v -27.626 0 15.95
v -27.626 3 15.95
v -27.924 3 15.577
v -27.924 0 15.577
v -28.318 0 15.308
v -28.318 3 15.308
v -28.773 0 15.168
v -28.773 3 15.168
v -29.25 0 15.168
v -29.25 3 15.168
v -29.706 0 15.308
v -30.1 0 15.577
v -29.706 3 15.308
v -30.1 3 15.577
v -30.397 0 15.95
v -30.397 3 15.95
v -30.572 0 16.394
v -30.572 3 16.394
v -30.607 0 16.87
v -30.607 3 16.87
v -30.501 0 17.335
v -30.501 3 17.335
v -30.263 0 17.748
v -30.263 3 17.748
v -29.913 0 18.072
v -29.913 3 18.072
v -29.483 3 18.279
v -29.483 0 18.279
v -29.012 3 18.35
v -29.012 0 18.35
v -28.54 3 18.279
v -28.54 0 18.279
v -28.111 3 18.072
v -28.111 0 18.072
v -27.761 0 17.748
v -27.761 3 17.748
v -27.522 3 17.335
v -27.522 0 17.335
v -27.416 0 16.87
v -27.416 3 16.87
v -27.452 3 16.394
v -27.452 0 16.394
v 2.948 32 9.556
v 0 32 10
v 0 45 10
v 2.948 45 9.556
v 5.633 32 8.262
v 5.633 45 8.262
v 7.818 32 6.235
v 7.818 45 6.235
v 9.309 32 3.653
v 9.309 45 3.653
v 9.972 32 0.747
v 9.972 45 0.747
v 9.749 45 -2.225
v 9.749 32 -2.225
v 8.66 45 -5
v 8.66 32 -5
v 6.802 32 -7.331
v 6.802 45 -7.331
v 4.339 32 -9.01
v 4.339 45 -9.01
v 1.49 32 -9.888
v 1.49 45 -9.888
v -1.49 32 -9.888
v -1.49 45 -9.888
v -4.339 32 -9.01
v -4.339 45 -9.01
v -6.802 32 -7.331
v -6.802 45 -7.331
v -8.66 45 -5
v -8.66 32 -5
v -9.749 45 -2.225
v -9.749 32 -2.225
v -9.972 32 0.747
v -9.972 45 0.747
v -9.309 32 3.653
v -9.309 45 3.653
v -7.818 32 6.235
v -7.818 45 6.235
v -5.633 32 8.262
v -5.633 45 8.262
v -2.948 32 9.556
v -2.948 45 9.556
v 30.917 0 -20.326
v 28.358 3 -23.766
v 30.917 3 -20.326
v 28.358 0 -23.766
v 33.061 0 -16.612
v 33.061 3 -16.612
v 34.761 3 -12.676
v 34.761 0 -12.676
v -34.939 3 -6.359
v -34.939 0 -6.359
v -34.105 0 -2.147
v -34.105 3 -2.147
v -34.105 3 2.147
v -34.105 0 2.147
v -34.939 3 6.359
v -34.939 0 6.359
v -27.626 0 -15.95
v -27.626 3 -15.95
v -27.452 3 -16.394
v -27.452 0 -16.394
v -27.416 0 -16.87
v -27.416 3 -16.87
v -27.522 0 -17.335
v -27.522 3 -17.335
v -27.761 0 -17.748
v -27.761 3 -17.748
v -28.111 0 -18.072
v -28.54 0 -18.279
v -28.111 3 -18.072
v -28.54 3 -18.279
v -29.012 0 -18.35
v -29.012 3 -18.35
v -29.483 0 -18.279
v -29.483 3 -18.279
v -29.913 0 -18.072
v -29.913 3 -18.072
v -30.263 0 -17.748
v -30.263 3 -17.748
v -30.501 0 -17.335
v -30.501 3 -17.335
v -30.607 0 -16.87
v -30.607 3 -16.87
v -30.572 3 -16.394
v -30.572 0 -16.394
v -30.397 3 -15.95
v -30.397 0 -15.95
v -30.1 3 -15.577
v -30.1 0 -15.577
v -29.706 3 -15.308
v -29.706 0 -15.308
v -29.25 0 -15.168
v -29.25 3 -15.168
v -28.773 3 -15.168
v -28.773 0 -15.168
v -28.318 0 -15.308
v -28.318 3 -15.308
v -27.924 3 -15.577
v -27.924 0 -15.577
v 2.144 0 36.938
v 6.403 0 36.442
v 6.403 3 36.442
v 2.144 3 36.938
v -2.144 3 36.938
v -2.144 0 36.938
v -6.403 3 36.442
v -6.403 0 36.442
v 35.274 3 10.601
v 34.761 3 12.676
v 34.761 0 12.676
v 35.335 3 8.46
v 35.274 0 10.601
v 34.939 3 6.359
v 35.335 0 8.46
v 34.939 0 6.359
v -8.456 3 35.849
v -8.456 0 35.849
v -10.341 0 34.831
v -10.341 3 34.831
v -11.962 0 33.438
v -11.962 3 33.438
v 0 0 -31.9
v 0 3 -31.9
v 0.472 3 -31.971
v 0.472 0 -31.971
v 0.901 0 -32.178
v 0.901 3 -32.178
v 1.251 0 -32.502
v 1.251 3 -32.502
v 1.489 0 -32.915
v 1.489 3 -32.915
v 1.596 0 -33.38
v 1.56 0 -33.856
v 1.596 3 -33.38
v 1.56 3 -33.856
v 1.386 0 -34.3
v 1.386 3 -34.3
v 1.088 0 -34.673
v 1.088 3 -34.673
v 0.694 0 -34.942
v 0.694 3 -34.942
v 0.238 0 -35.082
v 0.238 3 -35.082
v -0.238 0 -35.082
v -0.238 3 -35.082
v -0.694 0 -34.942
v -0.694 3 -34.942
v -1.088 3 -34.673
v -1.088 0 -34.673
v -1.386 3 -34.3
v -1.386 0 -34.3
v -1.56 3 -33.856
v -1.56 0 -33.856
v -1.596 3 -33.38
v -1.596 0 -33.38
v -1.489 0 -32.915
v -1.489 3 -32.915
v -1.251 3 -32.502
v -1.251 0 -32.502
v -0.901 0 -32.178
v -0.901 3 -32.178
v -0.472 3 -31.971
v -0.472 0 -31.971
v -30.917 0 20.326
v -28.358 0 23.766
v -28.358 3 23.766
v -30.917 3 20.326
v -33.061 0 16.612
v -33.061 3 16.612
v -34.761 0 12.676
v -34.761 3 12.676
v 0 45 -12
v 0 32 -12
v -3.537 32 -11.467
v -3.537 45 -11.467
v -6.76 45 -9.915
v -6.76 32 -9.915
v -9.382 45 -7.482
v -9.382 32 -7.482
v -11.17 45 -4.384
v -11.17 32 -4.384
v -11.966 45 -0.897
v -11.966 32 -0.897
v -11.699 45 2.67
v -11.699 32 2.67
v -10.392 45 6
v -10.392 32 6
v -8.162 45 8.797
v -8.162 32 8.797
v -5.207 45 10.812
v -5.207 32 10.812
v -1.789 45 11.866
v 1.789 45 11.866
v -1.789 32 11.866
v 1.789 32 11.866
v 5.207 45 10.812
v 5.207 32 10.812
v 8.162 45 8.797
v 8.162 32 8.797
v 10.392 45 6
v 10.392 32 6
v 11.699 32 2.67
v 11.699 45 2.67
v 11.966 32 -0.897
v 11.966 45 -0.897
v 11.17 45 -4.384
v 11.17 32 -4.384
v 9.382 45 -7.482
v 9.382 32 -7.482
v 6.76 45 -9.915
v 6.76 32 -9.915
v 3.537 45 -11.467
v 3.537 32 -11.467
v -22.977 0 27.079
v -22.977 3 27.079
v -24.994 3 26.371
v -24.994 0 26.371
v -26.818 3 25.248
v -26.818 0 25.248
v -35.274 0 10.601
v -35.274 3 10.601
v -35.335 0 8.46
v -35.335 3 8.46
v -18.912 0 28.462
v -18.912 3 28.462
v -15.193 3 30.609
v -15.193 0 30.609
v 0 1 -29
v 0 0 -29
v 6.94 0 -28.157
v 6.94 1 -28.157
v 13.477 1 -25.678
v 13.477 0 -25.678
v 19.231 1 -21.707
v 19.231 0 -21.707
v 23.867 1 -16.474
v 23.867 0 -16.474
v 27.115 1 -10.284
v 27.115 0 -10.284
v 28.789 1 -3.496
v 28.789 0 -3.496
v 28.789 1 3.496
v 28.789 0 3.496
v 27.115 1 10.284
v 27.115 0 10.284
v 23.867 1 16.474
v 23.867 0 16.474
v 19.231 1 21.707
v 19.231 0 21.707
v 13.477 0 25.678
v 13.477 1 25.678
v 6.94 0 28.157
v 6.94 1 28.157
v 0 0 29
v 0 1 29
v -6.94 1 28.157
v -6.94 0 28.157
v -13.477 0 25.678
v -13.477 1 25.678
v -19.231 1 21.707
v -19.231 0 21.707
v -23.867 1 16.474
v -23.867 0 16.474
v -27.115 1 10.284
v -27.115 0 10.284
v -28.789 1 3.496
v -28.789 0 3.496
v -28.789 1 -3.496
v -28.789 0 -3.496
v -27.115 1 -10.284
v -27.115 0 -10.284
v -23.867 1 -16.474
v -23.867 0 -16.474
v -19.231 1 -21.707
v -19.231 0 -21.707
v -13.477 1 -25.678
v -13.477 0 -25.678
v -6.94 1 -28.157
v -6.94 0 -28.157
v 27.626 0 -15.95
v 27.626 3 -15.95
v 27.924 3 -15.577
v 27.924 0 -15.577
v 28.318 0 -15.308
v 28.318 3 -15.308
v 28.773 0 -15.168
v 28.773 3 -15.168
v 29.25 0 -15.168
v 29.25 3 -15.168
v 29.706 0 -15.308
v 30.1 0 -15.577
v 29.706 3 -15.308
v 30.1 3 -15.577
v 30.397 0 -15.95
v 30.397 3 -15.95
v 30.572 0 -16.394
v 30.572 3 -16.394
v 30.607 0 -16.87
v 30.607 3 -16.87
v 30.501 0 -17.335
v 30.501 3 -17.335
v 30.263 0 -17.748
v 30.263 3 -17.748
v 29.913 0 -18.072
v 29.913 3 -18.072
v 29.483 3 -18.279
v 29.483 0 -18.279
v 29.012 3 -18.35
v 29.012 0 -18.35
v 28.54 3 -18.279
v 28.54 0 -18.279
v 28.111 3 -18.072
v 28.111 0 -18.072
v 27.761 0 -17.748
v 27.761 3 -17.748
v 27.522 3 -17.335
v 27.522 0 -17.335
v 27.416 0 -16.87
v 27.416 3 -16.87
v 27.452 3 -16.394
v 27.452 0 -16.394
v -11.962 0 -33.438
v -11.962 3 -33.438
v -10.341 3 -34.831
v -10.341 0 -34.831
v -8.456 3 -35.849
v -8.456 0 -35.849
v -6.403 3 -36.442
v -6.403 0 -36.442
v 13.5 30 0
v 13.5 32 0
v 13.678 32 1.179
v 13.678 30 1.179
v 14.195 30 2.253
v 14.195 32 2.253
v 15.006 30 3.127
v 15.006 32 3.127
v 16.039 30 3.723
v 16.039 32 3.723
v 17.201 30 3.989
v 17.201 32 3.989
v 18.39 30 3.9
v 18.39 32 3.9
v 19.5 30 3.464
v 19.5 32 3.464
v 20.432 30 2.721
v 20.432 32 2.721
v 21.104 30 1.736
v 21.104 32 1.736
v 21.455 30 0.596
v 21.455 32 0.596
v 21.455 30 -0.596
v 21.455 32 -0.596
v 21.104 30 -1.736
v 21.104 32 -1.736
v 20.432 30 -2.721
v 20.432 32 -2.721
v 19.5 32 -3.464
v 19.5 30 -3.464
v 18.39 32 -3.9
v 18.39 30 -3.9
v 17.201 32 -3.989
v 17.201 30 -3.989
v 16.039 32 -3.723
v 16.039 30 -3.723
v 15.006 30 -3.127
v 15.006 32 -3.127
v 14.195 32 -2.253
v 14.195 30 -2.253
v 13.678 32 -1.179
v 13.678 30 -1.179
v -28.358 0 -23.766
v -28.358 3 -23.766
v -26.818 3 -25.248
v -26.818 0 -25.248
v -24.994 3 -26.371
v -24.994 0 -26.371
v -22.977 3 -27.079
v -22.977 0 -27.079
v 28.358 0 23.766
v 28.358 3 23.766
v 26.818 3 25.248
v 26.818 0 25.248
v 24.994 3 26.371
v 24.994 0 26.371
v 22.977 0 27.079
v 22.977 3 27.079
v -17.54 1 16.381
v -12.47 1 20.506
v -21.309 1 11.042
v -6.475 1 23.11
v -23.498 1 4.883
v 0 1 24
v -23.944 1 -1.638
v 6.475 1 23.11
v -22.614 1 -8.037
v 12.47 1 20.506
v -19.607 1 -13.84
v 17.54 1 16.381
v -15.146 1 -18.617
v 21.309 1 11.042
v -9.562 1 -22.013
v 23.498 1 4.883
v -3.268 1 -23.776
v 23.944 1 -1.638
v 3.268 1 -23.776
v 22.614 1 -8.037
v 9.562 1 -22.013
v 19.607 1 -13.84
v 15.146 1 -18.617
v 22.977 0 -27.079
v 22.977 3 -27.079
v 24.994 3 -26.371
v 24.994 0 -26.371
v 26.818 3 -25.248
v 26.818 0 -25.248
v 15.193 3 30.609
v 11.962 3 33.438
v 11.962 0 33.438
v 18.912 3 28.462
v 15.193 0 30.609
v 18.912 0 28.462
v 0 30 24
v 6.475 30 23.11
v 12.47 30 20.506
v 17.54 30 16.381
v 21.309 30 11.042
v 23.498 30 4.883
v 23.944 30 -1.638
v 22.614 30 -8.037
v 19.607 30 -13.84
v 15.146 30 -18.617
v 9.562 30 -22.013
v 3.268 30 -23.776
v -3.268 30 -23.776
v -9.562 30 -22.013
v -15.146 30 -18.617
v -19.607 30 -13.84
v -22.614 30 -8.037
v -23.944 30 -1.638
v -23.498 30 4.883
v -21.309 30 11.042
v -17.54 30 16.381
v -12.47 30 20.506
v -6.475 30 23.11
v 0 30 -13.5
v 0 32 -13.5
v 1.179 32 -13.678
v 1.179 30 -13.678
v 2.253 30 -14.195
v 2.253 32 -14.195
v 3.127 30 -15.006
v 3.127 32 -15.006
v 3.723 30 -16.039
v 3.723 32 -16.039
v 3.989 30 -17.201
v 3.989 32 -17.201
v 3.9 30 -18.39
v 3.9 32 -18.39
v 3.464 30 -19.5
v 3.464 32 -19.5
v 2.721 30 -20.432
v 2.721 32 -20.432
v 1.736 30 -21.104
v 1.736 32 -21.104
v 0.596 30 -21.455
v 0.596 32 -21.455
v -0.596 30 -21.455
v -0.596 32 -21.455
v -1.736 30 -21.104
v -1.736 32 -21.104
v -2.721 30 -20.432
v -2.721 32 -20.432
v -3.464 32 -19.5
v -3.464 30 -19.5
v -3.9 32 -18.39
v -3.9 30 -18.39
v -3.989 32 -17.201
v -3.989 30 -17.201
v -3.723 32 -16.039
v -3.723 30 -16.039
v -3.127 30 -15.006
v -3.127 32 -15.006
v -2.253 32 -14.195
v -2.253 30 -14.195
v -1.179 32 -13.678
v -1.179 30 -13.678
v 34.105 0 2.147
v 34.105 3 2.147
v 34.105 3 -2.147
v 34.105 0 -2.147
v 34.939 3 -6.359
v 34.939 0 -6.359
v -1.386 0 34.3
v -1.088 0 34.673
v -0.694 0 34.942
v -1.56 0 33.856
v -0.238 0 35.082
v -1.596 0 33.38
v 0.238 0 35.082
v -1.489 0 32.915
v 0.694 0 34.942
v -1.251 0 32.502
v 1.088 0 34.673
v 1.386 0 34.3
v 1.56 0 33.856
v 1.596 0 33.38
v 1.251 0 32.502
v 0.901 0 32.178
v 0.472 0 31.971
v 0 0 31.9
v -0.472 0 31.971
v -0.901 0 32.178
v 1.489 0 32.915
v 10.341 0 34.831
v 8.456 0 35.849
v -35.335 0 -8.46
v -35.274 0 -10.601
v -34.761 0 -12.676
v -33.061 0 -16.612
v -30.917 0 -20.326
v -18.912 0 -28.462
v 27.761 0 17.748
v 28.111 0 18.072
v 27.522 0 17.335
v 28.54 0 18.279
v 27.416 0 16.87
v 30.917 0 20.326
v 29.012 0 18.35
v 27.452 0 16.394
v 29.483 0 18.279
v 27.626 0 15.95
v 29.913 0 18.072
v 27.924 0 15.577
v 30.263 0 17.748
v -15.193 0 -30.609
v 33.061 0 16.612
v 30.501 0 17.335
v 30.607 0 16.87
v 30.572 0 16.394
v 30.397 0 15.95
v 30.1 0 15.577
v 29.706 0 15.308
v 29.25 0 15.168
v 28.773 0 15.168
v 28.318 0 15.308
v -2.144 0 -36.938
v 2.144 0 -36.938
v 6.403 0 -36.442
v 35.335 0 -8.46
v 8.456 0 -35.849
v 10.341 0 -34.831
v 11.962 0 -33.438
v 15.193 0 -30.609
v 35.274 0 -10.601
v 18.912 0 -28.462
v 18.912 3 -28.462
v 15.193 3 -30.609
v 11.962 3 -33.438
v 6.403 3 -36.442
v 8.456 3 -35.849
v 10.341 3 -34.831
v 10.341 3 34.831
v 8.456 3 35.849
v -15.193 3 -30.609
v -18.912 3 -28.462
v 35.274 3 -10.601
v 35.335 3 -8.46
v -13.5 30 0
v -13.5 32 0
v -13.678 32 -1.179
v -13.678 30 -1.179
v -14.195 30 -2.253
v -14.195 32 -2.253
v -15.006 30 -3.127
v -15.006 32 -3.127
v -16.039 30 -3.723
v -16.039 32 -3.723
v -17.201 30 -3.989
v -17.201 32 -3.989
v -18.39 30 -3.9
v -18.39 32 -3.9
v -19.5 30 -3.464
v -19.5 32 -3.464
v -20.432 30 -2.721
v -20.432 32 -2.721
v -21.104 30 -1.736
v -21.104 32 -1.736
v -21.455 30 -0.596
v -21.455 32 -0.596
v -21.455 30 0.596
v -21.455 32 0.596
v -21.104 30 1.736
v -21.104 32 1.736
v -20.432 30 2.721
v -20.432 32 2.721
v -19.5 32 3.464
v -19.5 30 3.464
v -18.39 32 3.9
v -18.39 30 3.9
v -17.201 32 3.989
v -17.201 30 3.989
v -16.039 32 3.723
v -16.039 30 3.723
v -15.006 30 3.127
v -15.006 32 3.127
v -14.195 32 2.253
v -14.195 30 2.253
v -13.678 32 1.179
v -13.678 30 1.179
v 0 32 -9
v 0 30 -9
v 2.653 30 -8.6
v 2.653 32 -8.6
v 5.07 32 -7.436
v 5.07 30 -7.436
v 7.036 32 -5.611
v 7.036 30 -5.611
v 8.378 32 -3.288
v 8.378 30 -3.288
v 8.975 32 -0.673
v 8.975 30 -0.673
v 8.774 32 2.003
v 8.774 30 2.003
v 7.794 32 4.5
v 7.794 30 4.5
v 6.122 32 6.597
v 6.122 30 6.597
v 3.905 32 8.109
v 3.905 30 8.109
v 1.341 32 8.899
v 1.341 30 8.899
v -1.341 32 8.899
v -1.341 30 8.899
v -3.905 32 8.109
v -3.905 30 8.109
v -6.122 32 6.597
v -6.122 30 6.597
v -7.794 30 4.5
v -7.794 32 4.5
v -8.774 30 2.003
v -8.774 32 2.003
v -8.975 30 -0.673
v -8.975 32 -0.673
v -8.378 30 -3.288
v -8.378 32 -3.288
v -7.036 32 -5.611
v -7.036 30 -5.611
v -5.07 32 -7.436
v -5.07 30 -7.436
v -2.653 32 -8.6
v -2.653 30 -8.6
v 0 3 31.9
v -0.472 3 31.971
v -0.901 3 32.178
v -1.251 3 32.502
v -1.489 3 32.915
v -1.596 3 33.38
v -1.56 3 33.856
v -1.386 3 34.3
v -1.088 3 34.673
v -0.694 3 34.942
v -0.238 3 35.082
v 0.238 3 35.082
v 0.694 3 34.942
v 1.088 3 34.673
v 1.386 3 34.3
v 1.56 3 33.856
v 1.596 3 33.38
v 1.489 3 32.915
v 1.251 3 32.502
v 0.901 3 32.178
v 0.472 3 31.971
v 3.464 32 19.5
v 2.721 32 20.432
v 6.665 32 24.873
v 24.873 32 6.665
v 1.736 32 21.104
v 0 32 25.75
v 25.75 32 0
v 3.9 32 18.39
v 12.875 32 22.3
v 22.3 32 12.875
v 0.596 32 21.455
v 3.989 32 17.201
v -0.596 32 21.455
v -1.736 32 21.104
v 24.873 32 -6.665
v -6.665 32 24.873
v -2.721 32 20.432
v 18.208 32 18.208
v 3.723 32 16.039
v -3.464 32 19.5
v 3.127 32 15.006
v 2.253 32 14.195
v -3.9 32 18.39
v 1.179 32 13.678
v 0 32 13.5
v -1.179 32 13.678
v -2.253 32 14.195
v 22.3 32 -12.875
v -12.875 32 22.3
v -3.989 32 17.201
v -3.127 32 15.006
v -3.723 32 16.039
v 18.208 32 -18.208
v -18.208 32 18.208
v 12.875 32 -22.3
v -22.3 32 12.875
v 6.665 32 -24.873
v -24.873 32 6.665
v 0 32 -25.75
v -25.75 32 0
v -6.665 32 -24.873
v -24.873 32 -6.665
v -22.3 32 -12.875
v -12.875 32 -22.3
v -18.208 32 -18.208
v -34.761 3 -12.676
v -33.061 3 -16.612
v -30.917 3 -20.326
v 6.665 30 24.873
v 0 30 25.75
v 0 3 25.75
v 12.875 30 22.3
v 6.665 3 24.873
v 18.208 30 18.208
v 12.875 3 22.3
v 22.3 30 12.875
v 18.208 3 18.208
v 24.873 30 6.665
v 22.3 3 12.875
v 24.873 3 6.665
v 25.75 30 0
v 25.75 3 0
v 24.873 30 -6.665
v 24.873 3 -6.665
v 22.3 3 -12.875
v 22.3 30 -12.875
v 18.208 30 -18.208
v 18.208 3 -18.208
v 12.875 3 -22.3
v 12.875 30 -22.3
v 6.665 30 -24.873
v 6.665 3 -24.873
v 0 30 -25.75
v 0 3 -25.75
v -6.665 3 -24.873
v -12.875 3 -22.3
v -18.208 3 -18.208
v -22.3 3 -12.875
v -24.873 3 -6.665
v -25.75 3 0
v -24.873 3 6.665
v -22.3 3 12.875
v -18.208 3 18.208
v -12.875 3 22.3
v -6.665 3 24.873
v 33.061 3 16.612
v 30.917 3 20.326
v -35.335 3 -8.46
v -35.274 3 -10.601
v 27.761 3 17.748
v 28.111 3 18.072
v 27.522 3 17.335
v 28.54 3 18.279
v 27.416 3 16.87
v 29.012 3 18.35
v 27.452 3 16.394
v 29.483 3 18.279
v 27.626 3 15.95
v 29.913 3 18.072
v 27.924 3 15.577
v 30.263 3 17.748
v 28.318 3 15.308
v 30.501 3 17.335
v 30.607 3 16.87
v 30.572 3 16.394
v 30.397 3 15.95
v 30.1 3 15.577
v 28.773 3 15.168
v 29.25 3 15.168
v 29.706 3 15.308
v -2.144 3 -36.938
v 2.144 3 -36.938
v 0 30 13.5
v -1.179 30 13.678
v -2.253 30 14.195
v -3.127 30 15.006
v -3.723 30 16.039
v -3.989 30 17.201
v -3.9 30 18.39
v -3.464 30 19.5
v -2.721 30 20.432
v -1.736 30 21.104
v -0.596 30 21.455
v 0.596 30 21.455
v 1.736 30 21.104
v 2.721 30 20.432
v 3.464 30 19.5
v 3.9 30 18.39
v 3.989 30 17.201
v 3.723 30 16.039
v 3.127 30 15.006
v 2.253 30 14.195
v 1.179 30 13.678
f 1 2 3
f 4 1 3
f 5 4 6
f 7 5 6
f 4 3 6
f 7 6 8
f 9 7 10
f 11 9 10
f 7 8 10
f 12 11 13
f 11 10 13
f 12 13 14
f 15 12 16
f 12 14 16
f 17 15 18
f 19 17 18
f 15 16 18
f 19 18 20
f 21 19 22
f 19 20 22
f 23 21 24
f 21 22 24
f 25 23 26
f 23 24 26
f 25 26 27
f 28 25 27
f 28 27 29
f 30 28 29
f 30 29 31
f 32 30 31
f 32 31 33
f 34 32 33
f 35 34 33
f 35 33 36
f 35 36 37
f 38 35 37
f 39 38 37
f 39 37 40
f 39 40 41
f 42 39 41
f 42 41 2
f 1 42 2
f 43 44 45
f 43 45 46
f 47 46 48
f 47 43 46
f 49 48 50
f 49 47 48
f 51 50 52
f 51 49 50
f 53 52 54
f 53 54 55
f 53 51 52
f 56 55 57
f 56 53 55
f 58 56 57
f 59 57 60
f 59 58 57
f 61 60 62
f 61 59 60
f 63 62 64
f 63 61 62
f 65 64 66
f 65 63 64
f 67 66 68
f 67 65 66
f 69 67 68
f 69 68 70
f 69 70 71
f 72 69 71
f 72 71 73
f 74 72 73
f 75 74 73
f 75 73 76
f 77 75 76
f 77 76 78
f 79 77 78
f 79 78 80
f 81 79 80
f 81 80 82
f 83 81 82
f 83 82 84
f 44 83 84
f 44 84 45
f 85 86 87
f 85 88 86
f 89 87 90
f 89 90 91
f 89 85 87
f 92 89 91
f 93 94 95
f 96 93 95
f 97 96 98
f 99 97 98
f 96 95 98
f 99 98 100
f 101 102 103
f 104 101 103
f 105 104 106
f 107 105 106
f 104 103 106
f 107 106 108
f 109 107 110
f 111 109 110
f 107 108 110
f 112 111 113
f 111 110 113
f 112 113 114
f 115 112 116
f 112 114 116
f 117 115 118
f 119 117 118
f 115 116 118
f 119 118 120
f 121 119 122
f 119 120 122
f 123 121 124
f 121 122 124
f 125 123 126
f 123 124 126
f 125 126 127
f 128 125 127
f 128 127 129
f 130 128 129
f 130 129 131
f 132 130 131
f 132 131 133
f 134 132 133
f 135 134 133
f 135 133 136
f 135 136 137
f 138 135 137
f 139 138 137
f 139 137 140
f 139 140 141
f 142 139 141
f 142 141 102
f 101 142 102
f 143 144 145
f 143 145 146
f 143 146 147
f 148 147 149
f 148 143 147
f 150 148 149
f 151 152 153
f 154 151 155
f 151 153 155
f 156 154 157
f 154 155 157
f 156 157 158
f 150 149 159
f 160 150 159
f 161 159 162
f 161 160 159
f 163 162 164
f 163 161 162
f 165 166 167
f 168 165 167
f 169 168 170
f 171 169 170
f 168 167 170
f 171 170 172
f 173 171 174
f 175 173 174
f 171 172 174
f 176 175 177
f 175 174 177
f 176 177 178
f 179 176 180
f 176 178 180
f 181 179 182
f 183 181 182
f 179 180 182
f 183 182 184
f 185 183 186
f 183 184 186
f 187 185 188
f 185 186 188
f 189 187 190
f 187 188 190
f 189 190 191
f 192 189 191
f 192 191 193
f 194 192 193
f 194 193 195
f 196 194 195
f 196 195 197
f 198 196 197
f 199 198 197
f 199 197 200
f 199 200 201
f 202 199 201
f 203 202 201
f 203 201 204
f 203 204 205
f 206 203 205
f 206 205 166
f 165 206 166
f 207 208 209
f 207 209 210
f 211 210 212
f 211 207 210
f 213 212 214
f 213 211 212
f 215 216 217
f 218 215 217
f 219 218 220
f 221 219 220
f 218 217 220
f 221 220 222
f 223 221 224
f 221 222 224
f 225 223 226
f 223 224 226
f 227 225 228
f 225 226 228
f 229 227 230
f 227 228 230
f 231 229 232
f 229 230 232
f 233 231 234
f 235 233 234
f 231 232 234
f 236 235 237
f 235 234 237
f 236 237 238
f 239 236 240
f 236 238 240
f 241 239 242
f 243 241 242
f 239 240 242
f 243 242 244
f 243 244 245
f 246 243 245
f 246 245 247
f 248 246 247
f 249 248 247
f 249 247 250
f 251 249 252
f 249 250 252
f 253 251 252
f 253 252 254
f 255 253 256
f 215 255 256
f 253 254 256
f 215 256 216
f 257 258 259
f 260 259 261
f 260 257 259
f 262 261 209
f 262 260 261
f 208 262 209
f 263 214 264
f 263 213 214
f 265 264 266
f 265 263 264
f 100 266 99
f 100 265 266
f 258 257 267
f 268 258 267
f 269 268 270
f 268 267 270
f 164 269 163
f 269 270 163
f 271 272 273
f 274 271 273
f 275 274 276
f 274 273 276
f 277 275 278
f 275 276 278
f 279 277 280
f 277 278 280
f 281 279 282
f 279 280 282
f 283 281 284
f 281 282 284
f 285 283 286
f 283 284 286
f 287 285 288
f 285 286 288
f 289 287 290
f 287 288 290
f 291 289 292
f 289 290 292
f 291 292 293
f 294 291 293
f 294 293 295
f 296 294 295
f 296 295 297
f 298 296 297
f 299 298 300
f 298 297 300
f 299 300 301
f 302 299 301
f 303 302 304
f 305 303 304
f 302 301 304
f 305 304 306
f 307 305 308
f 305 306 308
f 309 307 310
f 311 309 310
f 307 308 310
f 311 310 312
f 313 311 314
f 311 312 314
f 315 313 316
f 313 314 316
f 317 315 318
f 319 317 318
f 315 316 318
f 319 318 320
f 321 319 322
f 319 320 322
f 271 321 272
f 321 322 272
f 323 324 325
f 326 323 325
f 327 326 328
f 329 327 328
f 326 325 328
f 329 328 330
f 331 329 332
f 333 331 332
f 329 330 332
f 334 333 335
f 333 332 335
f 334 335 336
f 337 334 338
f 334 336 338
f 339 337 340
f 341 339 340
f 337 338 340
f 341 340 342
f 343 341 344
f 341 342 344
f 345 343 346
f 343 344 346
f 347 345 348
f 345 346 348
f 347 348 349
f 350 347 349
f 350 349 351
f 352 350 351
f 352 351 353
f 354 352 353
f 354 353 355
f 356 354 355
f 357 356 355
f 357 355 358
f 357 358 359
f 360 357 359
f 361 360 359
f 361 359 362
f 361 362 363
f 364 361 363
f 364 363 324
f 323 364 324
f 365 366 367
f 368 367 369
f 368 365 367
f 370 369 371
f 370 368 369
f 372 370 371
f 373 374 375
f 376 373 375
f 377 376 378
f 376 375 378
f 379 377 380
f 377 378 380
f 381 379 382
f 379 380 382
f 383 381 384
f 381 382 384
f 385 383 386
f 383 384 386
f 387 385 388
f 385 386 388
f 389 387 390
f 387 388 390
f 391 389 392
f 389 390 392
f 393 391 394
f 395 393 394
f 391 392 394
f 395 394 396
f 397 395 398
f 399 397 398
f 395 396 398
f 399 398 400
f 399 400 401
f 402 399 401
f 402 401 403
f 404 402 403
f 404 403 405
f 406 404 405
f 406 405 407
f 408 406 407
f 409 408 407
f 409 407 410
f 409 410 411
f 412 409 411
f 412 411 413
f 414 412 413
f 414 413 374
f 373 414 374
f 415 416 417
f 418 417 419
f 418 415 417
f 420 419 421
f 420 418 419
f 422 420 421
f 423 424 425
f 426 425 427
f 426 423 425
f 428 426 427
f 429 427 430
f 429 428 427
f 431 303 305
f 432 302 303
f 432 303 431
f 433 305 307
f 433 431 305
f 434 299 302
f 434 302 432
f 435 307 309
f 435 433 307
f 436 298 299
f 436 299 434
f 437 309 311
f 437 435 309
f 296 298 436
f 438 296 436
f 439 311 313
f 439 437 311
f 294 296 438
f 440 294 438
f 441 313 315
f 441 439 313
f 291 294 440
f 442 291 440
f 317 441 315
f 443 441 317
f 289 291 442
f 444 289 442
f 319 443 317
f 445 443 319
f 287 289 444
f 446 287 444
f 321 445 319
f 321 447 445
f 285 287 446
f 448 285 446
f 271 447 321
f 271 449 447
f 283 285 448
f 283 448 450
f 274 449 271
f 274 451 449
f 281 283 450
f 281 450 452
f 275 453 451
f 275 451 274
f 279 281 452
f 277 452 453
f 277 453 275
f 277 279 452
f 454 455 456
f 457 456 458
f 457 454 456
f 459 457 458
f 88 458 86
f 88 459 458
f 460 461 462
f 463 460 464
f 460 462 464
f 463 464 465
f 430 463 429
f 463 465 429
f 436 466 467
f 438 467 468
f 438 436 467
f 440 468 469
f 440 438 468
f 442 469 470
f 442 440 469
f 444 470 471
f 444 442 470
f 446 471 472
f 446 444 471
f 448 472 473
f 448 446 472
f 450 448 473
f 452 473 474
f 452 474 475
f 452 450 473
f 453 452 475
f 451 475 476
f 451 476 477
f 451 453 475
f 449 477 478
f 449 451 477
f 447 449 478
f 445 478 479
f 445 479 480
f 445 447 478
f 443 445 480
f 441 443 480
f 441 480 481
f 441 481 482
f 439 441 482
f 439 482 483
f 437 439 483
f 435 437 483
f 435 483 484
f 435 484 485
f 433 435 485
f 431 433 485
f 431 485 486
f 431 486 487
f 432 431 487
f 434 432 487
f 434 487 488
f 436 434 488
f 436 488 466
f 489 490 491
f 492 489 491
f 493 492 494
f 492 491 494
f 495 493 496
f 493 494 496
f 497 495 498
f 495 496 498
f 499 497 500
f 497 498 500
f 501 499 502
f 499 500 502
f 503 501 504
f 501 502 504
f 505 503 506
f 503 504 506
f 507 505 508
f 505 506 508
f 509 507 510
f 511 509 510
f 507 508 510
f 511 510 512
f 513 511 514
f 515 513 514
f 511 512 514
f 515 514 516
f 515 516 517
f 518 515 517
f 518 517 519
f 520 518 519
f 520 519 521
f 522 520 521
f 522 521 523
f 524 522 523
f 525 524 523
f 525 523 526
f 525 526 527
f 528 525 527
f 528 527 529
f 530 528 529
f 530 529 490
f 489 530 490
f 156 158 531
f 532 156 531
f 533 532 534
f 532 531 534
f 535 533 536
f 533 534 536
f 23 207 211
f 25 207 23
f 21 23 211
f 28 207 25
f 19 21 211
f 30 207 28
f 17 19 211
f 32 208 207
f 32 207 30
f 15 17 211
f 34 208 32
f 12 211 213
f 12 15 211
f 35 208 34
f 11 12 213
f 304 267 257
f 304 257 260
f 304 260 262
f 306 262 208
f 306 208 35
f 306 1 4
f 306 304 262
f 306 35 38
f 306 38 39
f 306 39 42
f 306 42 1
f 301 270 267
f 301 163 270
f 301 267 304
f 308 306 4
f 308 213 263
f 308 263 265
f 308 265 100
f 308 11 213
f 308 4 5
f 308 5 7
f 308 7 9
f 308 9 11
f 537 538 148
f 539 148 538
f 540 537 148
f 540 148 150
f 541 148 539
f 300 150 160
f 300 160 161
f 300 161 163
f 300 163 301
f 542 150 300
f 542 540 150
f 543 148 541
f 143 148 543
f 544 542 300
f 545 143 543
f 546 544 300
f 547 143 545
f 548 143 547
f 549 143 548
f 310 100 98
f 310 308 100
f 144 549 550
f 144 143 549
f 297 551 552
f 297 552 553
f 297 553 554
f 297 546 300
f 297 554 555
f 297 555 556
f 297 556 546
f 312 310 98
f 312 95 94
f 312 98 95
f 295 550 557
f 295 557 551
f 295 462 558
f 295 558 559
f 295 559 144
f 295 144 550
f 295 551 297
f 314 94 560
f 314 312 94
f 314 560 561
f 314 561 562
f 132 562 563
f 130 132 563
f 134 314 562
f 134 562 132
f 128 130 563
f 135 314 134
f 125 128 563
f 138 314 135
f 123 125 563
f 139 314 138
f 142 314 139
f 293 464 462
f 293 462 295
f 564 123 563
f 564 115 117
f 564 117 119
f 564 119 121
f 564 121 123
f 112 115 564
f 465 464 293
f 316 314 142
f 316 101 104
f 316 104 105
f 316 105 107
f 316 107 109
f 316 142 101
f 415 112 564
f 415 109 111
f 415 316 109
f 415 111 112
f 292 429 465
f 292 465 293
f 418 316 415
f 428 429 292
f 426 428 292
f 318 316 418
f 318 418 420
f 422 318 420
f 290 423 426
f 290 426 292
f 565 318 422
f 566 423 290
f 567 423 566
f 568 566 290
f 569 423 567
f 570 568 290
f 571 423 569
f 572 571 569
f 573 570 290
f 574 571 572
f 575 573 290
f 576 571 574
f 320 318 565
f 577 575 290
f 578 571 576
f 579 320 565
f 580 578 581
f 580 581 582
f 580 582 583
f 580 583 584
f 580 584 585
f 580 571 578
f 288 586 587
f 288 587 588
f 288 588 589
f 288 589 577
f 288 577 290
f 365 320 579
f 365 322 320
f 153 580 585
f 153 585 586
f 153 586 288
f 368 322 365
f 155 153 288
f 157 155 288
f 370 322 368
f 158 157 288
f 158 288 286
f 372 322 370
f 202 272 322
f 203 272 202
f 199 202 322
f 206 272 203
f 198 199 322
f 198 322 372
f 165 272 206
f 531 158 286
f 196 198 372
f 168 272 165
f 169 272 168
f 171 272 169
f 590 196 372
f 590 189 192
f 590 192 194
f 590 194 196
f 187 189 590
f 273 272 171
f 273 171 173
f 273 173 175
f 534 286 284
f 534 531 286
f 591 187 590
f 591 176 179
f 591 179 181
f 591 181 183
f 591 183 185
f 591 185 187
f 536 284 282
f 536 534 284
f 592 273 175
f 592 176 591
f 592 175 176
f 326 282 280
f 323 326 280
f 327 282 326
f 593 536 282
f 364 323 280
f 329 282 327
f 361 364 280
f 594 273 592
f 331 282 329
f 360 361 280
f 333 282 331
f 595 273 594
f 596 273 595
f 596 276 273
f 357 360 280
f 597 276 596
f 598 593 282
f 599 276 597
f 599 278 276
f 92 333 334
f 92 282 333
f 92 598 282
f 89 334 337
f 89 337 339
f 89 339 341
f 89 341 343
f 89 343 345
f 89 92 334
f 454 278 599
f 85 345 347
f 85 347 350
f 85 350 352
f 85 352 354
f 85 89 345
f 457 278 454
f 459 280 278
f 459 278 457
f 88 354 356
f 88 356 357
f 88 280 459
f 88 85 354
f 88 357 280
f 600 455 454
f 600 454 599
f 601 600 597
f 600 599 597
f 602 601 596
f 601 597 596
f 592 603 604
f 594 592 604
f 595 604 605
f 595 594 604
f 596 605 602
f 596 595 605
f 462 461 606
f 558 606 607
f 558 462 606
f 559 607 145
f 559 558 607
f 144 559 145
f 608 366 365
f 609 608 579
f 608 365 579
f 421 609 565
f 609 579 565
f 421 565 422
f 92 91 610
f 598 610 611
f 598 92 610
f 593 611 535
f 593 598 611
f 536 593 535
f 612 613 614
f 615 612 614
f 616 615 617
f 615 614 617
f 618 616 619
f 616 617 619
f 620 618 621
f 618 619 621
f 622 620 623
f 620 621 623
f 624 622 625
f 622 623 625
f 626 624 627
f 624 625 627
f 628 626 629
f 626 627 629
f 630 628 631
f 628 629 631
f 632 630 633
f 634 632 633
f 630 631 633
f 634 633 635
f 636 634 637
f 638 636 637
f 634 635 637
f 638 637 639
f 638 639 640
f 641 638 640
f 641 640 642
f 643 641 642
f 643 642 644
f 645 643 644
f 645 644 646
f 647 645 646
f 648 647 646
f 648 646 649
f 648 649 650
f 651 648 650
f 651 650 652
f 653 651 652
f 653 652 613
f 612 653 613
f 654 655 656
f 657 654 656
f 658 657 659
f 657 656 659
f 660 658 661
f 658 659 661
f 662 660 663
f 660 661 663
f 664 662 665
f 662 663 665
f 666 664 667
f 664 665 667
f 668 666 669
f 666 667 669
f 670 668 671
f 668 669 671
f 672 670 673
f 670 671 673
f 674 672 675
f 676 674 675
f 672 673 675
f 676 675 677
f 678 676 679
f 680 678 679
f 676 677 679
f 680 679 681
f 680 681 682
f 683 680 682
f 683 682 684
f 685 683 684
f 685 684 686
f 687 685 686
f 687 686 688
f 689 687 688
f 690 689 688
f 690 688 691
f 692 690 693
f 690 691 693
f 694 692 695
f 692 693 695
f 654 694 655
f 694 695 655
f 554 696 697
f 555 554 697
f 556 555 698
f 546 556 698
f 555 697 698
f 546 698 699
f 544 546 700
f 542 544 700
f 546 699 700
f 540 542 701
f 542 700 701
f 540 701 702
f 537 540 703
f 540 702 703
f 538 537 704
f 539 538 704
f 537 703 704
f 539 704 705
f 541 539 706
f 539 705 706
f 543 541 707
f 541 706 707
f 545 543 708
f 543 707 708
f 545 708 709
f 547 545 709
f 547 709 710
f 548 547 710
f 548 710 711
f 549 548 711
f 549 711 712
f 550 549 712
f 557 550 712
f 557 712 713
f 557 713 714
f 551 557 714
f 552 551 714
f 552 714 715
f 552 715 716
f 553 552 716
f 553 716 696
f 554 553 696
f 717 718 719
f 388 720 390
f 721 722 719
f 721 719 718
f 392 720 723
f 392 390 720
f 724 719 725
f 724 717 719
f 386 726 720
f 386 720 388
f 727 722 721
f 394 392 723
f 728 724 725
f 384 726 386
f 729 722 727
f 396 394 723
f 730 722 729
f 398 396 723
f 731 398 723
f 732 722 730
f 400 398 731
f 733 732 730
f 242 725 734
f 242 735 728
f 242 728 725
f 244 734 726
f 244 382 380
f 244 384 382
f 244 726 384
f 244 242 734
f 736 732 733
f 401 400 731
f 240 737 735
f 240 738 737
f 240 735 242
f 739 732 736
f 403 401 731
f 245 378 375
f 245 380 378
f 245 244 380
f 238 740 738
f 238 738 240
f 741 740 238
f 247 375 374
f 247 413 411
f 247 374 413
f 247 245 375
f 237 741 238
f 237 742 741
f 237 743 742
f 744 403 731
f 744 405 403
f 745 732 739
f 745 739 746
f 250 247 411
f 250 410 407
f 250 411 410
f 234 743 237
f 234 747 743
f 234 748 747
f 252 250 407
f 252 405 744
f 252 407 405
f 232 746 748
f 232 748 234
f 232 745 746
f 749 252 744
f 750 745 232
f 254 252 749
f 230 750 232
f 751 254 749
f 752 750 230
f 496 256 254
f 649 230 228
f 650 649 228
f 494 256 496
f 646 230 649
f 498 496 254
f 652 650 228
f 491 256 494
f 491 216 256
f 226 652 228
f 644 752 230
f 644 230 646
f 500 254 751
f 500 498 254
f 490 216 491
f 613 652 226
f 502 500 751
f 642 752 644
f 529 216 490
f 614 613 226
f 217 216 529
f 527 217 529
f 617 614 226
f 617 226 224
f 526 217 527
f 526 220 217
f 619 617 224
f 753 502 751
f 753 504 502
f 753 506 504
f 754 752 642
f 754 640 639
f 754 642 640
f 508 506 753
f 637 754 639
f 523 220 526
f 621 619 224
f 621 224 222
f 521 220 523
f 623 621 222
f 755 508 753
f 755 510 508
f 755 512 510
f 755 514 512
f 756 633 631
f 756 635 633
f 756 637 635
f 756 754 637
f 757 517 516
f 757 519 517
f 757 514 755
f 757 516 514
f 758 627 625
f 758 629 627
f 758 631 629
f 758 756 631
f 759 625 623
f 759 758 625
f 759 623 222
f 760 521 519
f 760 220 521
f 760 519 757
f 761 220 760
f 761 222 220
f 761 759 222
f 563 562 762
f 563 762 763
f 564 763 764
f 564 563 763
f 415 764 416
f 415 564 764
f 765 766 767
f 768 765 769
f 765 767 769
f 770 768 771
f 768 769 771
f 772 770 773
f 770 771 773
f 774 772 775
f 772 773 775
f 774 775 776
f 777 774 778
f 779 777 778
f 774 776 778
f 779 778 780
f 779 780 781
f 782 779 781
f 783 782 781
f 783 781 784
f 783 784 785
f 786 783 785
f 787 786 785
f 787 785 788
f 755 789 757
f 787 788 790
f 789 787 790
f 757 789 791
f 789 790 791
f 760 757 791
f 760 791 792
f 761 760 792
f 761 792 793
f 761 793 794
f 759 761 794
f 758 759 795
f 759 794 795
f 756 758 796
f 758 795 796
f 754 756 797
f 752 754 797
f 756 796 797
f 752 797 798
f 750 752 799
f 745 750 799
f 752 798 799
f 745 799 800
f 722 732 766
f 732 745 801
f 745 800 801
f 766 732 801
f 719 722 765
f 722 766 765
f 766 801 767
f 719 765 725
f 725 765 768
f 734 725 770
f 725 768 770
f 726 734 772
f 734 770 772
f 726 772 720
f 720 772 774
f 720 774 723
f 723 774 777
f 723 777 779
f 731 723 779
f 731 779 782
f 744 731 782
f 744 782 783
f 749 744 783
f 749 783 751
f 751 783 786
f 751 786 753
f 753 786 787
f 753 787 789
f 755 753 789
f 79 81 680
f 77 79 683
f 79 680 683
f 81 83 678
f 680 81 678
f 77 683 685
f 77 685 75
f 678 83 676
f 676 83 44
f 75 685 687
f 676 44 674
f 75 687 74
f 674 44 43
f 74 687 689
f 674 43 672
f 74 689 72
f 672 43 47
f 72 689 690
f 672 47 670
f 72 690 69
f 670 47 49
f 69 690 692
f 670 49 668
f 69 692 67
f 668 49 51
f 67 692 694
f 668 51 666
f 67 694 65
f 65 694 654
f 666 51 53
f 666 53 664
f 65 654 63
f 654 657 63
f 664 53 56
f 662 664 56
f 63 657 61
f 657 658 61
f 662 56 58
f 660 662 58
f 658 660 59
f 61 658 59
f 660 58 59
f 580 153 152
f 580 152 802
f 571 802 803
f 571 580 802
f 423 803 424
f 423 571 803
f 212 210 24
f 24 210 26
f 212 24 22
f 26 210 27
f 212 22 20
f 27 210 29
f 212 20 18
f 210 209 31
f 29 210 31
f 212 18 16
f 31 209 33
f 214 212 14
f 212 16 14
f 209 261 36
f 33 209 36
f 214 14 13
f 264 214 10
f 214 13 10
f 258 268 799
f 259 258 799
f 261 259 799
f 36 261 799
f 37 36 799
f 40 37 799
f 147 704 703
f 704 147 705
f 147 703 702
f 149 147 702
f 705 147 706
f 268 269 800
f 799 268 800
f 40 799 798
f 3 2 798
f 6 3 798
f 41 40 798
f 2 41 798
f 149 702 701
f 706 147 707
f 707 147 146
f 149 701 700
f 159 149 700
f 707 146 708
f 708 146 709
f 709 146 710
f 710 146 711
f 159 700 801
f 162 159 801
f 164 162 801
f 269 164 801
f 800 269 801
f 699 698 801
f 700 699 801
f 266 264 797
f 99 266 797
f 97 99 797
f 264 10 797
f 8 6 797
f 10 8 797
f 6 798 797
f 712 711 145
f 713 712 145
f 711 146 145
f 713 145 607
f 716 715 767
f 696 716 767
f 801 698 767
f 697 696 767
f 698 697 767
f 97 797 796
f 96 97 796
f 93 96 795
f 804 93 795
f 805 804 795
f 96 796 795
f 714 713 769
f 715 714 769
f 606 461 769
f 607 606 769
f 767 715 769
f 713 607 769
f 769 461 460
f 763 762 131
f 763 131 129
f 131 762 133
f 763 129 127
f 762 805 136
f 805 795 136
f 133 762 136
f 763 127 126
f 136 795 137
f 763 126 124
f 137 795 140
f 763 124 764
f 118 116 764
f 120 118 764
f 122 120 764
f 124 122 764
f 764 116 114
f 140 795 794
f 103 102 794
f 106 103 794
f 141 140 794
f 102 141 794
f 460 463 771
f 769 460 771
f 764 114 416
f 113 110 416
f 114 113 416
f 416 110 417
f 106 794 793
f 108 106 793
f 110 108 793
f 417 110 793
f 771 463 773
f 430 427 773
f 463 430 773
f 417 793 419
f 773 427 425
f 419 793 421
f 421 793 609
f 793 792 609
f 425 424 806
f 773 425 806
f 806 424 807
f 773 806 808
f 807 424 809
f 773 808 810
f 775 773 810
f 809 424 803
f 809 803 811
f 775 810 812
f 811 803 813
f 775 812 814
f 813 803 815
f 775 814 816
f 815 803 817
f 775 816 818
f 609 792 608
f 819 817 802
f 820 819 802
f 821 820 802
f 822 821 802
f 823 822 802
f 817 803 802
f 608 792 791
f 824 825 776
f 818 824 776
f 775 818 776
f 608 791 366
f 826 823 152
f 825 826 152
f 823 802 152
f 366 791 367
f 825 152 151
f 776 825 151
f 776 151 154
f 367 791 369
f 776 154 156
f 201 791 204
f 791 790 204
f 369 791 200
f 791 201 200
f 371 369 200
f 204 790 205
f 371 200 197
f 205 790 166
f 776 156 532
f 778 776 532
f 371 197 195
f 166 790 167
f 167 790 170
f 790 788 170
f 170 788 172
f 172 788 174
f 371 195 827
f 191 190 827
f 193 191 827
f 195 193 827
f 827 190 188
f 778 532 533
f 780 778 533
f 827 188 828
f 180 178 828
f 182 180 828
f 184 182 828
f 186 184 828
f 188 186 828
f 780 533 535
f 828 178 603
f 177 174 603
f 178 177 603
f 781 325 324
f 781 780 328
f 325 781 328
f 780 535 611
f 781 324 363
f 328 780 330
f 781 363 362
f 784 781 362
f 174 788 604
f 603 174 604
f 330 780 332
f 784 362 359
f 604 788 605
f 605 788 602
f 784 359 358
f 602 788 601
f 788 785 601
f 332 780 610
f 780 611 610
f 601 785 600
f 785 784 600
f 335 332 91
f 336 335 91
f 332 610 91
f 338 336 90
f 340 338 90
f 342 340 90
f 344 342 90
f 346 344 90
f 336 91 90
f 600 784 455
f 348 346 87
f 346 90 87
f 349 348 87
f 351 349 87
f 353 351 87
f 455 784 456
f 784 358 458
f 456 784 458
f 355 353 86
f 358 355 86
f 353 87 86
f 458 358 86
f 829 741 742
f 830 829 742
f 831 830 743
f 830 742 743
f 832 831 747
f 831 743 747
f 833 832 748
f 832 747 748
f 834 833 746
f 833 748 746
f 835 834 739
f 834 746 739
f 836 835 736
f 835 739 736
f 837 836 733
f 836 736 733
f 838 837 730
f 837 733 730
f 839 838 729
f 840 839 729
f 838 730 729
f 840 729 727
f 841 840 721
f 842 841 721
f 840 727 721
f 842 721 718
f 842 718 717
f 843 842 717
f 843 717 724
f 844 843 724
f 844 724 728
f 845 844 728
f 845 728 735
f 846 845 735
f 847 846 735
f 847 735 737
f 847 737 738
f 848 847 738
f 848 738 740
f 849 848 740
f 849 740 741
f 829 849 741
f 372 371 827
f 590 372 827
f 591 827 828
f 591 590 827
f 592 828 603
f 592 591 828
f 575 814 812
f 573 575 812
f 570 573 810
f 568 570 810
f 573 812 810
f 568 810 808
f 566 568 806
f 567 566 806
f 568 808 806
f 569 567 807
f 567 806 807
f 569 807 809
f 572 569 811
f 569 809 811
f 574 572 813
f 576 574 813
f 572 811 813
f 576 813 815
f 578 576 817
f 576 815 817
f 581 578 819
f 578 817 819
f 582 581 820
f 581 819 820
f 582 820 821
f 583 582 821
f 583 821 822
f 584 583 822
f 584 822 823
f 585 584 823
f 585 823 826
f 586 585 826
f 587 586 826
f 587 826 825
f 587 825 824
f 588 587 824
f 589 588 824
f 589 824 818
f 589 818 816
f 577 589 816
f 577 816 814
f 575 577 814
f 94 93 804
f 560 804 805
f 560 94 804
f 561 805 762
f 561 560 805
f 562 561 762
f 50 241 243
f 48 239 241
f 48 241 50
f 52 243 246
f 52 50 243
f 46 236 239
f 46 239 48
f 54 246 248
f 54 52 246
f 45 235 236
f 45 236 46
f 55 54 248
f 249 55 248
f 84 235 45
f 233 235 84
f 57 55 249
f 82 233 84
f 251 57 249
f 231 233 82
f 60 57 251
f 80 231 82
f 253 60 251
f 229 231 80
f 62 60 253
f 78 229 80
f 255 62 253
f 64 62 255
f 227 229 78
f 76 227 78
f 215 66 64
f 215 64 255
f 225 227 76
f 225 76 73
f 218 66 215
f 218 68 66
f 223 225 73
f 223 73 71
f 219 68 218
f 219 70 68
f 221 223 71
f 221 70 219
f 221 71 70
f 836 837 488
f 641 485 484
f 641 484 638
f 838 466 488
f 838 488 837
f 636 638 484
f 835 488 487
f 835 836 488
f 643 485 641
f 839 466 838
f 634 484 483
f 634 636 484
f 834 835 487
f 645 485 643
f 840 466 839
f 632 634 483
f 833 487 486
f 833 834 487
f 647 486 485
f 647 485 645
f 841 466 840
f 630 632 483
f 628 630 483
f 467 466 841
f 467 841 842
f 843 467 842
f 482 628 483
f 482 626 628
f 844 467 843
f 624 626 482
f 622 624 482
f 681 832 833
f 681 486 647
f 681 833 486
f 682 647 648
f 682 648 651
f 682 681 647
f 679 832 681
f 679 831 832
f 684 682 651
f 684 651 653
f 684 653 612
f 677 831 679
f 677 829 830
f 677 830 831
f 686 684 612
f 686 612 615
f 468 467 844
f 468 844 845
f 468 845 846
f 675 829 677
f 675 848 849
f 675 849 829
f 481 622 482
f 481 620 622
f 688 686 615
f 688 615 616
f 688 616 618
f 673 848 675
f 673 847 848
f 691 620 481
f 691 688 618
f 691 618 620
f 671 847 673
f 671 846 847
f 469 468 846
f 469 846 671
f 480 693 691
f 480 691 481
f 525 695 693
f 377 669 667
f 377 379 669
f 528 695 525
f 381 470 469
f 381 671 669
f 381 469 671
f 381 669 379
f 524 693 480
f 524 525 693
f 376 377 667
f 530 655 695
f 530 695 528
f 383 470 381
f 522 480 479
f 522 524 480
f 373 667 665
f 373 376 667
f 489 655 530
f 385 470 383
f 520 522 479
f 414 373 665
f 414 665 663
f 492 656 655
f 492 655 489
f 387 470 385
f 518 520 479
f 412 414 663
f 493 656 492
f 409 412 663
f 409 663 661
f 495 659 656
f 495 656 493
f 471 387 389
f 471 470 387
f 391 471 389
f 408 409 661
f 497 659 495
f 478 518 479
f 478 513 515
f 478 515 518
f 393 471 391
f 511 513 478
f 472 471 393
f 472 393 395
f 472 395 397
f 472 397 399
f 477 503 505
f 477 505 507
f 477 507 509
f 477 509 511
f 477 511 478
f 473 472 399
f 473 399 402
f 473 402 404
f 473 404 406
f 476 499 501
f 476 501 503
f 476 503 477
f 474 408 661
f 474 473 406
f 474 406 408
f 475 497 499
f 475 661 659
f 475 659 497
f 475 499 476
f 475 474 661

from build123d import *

# Parameters (mm, degrees)
SKETCH_1_R               = 25.75
SKETCH_1_R_2             = 24
EXTRUDE_1_DEPTH          = 30
SKETCH_2_R               = 37
SKETCH_2_R_2             = 24
EXTRUDE_2_DEPTH          = 3
SKETCH_3_R               = 29
CUT_EXTRUDE_1_DEPTH      = 1
SKETCH_4_R               = 1.6
CUT_EXTRUDE_2_DEPTH      = 21
PATTERN_CIRCULAR_1_COUNT = 6
SKETCH_5_R               = 22
CUT_EXTRUDE_3_DEPTH      = 11
PATTERN_CIRCULAR_2_COUNT = 6
SKETCH_6_R               = 25.75
SKETCH_6_R_2             = 10
EXTRUDE_3_DEPTH          = 2
SKETCH_7_R               = 12
SKETCH_7_R_2             = 10
EXTRUDE_4_DEPTH          = 13
SKETCH_8_R               = 4
CUT_EXTRUDE_5_DEPTH      = 15.3
PATTERN_CIRCULAR_4_COUNT = 4
SKETCH_9_R               = 10
SKETCH_9_R_2             = 9
EXTRUDE_5_DEPTH          = 2
FILLET_1_R               = 10


with BuildPart() as part:
    # 草图1 → 凸台-拉伸1 (new body)
    with BuildSketch(Plane(origin=(0, 0, 0), x_dir=(1, 0, 0), z_dir=(0, 1, 0))):
        with Locations(Location((0, 0, 0), (0, 0, 270))):
            Circle(SKETCH_1_R)
        with Locations(Location((0, 0, 0), (0, 0, 270))):
            Circle(SKETCH_1_R_2, mode=Mode.SUBTRACT)
    extrude(amount=EXTRUDE_1_DEPTH)

    # 草图2 → 凸台-拉伸2 (add)
    with BuildSketch(Plane.XZ):
        with Locations(Location((0, 0, 0), (0, 0, 270))):
            Circle(SKETCH_2_R)
        with Locations(Location((0, 0, 0), (0, 0, 90))):
            Circle(SKETCH_2_R_2, mode=Mode.SUBTRACT)
    extrude(amount=-EXTRUDE_2_DEPTH)

    # 草图3 → 切除-拉伸1 (cut)
    with BuildSketch(Plane.XZ):
        with Locations(Location((0, 0, 0), (0, 0, 270))):
            Circle(SKETCH_3_R)
    extrude(amount=-CUT_EXTRUDE_1_DEPTH, mode=Mode.SUBTRACT)

    # 草图4 → 切除-拉伸2 (cut)
    with BuildSketch(Plane(origin=(0, 3, 0), x_dir=(1, 0, 0), z_dir=(0, 1, 0))):
        with Locations(Location((0, 33.5, 0), (0, 0, 270))):
            Circle(SKETCH_4_R)
    cut_extrude_2 = extrude(amount=-CUT_EXTRUDE_2_DEPTH, mode=Mode.SUBTRACT)

    # 阵列(圆周)1: 切除-拉伸2 ×6 about axis
    pattern_circular_1_axis = Axis((0, 0, 0), (0, 1, 0))
    for i in range(1, PATTERN_CIRCULAR_1_COUNT):
        add(cut_extrude_2.rotate(pattern_circular_1_axis, i * 360 / PATTERN_CIRCULAR_1_COUNT), mode=Mode.SUBTRACT)

    # 草图5 → 切除-拉伸3 (cut)
    with BuildSketch(Plane.XZ):
        with Locations((56, 0)):
            Circle(SKETCH_5_R)
    cut_extrude_3 = extrude(amount=-CUT_EXTRUDE_3_DEPTH, mode=Mode.SUBTRACT)

    # 阵列(圆周)2: 切除-拉伸3 ×6 about axis
    pattern_circular_2_axis = Axis((0, 0, 0), (0, 1, 0))
    for i in range(1, PATTERN_CIRCULAR_2_COUNT):
        add(cut_extrude_3.rotate(pattern_circular_2_axis, i * 360 / PATTERN_CIRCULAR_2_COUNT), mode=Mode.SUBTRACT)

    # 草图6 → 凸台-拉伸3 (add)
    with BuildSketch(Plane(origin=(0, 30, 0), x_dir=(1, 0, 0), z_dir=(0, 1, 0))):
        with Locations(Location((0, 0, 0), (0, 0, 90))):
            Circle(SKETCH_6_R)
        with Locations(Location((0, 0, 0), (0, 0, 270))):
            Circle(SKETCH_6_R_2, mode=Mode.SUBTRACT)
    extrude(amount=EXTRUDE_3_DEPTH)

    # 草图7 → 凸台-拉伸4 (add)
    with BuildSketch(Plane(origin=(0, 32, 0), x_dir=(1, 0, 0), z_dir=(0, 1, 0))):
        with Locations(Location((0, 0, 0), (0, 0, 90))):
            Circle(SKETCH_7_R)
        with Locations(Location((0, 0, 0), (0, 0, 270))):
            Circle(SKETCH_7_R_2, mode=Mode.SUBTRACT)
    extrude(amount=EXTRUDE_4_DEPTH)

    # 草图8 → 切除-拉伸5 (cut)
    with BuildSketch(Plane(origin=(0, 32, 0), x_dir=(1, 0, 0), z_dir=(0, 1, 0))):
        with Locations(Location((0, 17.5, 0), (0, 0, 270))):
            Circle(SKETCH_8_R)
    cut_extrude_5 = extrude(amount=-CUT_EXTRUDE_5_DEPTH, mode=Mode.SUBTRACT)

    # 阵列(圆周)4: 切除-拉伸5 ×4 about axis
    pattern_circular_4_axis = Axis((0, 0, 0), (0, 1, 0))
    for i in range(1, PATTERN_CIRCULAR_4_COUNT):
        add(cut_extrude_5.rotate(pattern_circular_4_axis, i * 360 / PATTERN_CIRCULAR_4_COUNT), mode=Mode.SUBTRACT)

    # 草图9 → 凸台-拉伸5 (add)
    with BuildSketch(Plane.XZ.offset(-30)):
        with Locations(Location((0, 0, 0), (0, 0, 270))):
            Circle(SKETCH_9_R)
        with Locations(Location((0, 0, 0), (0, 0, 270))):
            Circle(SKETCH_9_R_2, mode=Mode.SUBTRACT)
    extrude(amount=-EXTRUDE_5_DEPTH)

    # 圆角1
    fillet_1_edges = [part.edges().sort_by_distance(p)[0] for p in [
        (35.901785714, 1.5, -8.947724992),
        (35.901785714, 1.5, 8.947724992),
        (25.699850006, 1.5, 26.617995974),
        (10.201935708, 1.5, 35.565720966),
        (-10.201935708, 1.5, 35.565720966),
        (-25.699850006, 1.5, 26.617995974),
        (-35.901785714, 1.5, 8.947724992),
        (-35.901785714, 1.5, -8.947724992),
        (-25.699850006, 1.5, -26.617995974),
        (-10.201935708, 1.5, -35.565720966),
        (10.201935708, 1.5, -35.565720966),
        (25.699850006, 1.5, -26.617995974),
    ]]
    fillet(fillet_1_edges, radius=FILLET_1_R)


solid = part.part
